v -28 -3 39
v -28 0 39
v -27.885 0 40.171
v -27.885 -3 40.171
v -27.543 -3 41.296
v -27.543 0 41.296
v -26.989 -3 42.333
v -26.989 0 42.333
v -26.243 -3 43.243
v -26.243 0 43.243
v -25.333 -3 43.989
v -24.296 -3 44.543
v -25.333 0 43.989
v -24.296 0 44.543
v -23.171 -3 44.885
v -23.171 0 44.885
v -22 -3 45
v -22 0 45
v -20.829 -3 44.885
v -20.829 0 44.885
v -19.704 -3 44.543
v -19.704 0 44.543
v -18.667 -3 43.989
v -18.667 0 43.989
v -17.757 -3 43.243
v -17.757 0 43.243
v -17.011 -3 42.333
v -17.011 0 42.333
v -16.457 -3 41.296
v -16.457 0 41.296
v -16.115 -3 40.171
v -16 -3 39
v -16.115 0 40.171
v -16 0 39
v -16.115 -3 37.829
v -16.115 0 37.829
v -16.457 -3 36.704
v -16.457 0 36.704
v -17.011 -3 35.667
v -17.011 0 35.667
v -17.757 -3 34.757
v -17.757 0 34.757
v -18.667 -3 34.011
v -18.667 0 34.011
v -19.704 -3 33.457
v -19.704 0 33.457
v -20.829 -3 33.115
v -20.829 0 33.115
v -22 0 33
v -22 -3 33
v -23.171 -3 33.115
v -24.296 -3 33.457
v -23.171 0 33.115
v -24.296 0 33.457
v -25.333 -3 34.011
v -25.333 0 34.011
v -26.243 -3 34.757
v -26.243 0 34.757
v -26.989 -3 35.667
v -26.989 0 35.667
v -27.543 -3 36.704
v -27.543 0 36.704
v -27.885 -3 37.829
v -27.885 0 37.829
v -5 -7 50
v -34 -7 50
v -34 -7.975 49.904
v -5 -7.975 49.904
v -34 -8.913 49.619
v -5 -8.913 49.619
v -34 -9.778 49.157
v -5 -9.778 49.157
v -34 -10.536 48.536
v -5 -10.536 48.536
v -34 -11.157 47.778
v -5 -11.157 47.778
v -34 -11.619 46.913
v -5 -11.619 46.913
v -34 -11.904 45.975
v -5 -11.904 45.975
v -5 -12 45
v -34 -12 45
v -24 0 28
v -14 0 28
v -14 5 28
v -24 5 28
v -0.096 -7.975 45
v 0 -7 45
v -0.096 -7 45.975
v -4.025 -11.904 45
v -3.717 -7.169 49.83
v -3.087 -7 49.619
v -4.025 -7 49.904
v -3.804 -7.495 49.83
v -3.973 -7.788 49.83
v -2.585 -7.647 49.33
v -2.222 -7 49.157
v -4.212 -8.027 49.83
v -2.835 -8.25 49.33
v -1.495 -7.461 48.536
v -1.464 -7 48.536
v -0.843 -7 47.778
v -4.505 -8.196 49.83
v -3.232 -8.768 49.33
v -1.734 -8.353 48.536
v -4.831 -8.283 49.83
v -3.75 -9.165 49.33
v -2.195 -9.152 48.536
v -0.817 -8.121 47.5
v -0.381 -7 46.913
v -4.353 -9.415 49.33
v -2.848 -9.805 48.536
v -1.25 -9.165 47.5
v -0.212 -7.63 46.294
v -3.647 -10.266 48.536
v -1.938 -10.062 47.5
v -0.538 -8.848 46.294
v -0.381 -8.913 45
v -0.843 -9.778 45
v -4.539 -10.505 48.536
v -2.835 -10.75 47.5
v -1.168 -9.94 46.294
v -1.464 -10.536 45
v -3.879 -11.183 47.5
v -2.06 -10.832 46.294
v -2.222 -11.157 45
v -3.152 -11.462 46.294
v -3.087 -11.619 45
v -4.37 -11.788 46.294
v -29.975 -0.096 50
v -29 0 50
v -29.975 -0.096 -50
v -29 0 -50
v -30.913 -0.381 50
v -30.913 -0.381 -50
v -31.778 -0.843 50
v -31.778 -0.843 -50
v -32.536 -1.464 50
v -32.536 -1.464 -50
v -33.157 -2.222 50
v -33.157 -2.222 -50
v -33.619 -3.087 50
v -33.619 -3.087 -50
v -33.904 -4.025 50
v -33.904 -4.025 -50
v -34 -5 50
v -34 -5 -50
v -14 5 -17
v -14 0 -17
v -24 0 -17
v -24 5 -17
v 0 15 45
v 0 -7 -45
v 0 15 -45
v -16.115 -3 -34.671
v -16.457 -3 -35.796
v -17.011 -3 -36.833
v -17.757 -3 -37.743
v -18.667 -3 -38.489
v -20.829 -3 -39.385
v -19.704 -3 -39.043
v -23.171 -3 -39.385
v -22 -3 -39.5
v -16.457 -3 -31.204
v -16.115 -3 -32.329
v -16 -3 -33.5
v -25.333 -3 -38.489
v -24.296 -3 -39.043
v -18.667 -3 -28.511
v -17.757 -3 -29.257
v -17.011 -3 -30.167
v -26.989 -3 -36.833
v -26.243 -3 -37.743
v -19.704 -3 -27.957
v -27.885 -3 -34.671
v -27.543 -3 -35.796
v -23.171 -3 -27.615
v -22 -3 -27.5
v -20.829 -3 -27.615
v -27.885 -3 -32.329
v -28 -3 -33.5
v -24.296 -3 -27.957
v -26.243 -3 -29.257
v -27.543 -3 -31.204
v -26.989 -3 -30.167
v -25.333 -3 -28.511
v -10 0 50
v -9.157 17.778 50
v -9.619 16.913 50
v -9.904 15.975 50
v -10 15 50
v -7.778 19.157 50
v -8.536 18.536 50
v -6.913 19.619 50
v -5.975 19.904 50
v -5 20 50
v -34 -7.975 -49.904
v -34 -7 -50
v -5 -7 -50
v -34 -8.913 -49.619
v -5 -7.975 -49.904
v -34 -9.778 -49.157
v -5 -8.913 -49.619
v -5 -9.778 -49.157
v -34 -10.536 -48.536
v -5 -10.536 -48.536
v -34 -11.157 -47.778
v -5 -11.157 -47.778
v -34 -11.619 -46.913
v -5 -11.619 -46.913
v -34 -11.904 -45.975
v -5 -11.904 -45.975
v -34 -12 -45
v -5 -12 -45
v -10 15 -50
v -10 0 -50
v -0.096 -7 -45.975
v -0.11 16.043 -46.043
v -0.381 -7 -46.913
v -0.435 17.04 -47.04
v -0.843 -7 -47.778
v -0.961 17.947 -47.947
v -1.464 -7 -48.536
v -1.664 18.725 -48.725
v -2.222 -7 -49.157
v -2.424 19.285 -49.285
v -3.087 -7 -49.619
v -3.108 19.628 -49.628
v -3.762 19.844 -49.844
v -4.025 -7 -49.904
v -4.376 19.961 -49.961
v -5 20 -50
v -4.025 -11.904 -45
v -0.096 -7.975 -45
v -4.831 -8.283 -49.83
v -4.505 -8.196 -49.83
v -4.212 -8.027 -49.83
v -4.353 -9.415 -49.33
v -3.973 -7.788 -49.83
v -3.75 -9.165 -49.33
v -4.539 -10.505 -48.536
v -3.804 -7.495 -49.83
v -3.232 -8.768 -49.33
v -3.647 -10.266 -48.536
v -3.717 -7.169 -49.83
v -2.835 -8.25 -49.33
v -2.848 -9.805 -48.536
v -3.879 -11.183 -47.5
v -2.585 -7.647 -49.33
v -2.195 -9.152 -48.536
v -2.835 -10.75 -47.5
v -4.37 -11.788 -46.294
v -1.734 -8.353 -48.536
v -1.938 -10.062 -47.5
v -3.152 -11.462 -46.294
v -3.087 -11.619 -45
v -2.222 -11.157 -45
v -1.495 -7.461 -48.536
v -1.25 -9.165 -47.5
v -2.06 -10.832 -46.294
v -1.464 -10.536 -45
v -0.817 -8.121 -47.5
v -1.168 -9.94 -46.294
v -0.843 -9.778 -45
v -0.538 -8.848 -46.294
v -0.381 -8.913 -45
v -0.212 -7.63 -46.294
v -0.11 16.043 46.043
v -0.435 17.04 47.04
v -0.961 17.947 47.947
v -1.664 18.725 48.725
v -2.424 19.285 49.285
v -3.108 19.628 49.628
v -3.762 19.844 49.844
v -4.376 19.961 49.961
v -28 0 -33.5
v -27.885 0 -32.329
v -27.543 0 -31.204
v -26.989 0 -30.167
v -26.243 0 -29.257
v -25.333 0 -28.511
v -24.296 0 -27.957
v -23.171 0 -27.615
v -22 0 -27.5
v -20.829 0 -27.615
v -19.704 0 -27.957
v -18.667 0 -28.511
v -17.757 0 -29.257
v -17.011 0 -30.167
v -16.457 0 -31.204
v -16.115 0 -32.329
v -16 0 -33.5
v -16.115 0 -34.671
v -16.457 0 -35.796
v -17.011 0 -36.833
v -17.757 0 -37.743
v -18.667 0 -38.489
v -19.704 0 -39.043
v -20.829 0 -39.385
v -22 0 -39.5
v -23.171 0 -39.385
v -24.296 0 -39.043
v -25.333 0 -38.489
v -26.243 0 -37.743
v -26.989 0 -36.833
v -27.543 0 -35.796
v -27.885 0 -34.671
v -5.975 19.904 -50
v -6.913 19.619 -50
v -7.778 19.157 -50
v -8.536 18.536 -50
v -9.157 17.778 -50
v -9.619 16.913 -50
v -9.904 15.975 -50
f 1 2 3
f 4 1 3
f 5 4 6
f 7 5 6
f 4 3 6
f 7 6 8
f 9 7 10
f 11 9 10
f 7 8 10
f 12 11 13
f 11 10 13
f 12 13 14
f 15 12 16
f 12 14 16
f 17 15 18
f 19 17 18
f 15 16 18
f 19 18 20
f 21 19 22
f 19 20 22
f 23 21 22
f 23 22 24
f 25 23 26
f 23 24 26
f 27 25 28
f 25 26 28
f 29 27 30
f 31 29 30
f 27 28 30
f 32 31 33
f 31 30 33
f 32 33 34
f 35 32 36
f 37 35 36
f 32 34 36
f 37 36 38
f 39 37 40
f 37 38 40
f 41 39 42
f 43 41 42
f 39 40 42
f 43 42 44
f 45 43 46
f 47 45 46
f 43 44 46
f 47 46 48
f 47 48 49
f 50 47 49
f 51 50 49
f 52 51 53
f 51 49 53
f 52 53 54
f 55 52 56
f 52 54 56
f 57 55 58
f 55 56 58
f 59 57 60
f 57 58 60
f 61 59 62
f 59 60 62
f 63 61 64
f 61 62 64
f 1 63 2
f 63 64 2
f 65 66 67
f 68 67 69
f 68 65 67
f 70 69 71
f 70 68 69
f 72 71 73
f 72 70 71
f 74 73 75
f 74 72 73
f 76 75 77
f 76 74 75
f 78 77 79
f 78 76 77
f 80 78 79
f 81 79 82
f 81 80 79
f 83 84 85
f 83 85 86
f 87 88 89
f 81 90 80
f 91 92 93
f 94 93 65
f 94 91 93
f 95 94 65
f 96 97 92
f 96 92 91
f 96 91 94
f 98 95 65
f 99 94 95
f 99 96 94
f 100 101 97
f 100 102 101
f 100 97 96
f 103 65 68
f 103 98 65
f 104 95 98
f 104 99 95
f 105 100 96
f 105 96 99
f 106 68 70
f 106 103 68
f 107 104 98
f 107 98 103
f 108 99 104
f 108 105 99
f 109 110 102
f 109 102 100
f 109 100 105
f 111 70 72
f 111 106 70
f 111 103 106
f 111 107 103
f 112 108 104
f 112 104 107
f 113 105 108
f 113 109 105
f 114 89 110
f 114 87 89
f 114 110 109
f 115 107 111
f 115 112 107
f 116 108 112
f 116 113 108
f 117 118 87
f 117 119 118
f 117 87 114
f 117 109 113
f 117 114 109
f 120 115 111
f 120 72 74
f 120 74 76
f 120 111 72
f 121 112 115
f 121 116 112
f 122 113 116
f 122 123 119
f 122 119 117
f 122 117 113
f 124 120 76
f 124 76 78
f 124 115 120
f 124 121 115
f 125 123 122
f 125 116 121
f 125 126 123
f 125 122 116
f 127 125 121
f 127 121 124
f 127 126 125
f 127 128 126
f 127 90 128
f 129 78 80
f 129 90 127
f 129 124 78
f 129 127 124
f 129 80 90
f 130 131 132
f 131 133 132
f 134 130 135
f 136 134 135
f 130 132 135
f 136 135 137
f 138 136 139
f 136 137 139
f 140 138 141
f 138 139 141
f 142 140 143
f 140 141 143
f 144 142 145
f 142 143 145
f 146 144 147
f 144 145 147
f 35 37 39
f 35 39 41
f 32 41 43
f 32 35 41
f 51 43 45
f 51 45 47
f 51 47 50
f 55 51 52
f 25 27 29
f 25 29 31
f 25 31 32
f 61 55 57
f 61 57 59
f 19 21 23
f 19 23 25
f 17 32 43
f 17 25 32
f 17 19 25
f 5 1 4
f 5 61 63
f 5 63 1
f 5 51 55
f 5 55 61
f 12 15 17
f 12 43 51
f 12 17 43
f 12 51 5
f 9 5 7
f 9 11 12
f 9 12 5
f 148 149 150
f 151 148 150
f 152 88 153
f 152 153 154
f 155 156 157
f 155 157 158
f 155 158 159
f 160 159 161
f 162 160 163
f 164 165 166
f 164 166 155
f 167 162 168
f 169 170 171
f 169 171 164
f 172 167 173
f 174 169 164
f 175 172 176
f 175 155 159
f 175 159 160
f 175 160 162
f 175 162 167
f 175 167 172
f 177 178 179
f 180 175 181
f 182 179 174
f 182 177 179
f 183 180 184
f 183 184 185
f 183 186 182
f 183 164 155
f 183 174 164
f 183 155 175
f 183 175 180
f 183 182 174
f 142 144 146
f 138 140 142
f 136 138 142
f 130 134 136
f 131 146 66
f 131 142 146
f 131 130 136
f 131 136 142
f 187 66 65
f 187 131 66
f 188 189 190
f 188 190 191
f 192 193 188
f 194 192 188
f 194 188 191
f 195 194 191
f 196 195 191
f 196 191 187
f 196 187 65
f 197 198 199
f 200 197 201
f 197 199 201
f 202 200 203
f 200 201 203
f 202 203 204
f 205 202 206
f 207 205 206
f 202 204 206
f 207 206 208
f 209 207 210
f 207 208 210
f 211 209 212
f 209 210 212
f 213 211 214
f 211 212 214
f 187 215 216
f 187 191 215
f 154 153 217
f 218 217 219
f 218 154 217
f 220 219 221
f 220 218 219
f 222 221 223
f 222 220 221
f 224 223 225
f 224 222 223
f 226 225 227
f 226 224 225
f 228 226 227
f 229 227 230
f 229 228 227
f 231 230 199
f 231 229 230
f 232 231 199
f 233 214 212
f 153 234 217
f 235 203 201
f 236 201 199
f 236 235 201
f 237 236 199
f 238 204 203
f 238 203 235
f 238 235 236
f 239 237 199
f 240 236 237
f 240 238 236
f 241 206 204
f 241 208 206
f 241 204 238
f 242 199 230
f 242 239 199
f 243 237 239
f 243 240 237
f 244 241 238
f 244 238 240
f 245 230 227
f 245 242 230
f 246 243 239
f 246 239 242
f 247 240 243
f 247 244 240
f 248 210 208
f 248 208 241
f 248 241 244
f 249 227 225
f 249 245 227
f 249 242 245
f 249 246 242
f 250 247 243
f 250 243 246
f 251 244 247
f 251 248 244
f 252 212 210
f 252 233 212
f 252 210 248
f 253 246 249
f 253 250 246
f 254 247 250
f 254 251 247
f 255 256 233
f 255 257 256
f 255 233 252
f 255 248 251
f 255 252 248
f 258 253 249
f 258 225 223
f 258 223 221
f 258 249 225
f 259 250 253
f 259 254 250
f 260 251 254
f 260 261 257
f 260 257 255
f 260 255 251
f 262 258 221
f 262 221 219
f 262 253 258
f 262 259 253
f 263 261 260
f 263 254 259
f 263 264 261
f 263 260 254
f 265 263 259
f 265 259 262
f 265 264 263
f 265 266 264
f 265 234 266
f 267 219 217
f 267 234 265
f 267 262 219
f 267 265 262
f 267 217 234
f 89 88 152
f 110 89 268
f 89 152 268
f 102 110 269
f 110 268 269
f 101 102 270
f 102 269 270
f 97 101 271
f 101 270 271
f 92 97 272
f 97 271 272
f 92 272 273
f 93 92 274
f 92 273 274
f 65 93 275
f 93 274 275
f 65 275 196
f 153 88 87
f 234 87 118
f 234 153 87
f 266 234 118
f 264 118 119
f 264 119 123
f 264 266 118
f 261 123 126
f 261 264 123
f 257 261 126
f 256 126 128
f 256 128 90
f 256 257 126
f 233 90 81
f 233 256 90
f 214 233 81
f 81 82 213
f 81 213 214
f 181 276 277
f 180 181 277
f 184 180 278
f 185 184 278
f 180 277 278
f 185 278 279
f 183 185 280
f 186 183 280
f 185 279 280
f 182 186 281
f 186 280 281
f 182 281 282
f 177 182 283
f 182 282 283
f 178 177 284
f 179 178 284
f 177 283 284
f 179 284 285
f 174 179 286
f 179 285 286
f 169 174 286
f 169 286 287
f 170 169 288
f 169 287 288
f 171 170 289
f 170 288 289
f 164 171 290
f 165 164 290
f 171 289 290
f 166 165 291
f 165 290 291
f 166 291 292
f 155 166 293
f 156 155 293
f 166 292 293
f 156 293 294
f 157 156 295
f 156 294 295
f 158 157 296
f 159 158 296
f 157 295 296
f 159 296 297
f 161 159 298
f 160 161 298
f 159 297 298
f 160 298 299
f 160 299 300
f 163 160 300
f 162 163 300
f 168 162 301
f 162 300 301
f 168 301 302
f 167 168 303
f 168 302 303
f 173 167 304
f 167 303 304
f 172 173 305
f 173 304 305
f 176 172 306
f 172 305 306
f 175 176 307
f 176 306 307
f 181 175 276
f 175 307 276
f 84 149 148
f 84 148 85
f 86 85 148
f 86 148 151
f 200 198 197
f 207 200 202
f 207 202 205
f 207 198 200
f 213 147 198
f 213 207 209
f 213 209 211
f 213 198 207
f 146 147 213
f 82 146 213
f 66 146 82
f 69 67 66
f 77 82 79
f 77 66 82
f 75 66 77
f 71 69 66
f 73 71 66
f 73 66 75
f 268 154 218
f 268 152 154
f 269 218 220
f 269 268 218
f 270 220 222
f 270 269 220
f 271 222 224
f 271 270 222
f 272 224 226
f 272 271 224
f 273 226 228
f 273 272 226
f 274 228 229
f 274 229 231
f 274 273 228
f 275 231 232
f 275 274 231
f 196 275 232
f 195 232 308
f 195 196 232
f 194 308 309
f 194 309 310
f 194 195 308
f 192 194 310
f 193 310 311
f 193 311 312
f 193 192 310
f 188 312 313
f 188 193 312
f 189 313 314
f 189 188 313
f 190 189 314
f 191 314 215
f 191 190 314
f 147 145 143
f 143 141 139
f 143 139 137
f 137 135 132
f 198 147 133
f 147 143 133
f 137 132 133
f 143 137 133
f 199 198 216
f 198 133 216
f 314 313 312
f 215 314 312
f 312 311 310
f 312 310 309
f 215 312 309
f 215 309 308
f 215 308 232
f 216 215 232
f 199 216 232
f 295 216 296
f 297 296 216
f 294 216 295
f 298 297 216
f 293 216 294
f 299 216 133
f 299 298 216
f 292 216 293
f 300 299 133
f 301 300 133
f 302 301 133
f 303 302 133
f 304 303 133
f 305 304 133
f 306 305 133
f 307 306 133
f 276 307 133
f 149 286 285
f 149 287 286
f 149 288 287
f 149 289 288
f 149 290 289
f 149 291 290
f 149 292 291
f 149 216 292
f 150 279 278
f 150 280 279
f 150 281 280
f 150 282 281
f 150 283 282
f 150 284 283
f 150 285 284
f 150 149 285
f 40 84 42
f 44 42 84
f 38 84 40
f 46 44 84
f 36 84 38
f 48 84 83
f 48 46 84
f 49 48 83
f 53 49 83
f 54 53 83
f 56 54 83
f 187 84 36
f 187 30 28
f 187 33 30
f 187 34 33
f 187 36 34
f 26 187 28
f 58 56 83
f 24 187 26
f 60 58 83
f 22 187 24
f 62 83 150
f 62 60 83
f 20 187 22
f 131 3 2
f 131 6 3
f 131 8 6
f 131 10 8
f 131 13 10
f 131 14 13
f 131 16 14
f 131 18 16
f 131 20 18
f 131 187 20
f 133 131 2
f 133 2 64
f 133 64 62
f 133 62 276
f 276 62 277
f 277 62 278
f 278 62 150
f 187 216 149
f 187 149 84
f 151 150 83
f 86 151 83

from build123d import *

# Parameters (mm, degrees)
F1_DEPTH      = 50
F1_DEPTH_BACK = 50
F2_W          = 10
F2_H          = 45
F3_DEPTH      = 5
F4_R          = 6
F5_DEPTH      = 3
F6_R          = 4.99999


# Not quite as in the source:
# - a fillet or chamfer is up to 0.001 mm smaller than in the source, because OpenCascade refuses the exact size


with BuildPart() as f1:
    # F0 (on Top) → F1 (new body, two sides)
    with BuildSketch(Plane.XY) as f1_sk:
        Polygon((0, -12), (0, 0), (0, 20), (-10, 20), (-10, 0), (-34, 0), (-34, -12), align=None)
    extrude(amount=F1_DEPTH)
    extrude(f1_sk.sketch, amount=-F1_DEPTH_BACK)

    # F2 (on face) → F3 (join)
    with BuildSketch(Plane(origin=(0, 0, 0), x_dir=(-1, 0, 0), z_dir=(0, 1, 0))):
        with Locations((19, 5.5)):
            Rectangle(F2_W, F2_H)
    extrude(amount=F3_DEPTH)

    # F4 (on face) → F5 (cut)
    with BuildSketch(Plane(origin=(0, 0, 0), x_dir=(-1, 0, 0), z_dir=(0, 1, 0))):
        with Locations((22, 39)):
            Circle(F4_R)
        with Locations((22, -33.5)):
            Circle(F4_R)
    extrude(amount=-F5_DEPTH, mode=Mode.SUBTRACT)

    # F6 (radius 5 in the source; OpenCascade refuses exactly that, so slightly less here)
    f6_edges = [f1.edges().sort_by_distance(p)[0] for p in [
        (0, -12, 0),
        (0, 4, 50),
        (-17, -12, 50),
        (-17, -12, -50),
        (0, 4, -50),
        (-10, 20, 0),
        (0, 20, 0),
        (-34, 0, 0),
    ]]
    fillet(f6_edges, radius=F6_R)


solid = f1.part
